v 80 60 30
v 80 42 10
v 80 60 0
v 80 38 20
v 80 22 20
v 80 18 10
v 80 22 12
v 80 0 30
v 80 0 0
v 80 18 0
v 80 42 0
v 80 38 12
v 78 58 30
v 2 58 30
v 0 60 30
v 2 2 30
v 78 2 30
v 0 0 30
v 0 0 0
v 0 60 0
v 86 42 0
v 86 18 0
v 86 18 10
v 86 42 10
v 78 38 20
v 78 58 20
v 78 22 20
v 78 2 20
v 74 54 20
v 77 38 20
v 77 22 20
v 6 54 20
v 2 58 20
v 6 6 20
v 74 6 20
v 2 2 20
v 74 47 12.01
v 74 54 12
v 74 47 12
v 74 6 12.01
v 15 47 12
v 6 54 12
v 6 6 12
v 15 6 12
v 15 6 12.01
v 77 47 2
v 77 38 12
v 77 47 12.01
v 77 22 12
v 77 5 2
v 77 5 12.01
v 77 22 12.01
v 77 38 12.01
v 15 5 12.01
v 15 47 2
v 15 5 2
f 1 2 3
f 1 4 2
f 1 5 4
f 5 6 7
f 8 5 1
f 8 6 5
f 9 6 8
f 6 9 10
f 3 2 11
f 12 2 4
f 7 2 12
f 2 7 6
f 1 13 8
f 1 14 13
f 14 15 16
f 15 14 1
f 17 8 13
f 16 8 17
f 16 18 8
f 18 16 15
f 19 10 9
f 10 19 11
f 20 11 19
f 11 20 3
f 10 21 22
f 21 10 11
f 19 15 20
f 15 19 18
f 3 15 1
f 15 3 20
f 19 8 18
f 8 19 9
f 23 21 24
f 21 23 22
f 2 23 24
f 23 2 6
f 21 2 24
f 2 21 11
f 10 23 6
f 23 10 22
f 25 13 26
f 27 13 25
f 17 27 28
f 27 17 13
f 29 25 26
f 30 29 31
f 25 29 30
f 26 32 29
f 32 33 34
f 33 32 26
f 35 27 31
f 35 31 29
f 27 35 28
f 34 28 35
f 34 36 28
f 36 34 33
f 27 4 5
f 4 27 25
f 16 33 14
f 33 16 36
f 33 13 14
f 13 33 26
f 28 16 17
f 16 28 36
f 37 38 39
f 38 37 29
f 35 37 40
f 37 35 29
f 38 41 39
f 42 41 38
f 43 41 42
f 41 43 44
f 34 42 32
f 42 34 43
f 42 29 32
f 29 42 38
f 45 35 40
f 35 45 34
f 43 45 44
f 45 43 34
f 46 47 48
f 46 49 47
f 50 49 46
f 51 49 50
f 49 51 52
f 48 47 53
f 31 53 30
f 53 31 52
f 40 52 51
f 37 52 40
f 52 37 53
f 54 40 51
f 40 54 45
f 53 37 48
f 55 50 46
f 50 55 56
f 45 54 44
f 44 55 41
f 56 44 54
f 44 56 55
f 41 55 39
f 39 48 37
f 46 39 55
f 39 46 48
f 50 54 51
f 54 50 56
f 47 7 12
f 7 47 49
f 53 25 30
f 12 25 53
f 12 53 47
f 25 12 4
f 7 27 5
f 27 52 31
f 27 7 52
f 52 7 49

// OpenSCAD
// Outer block dimensions
outer_w = 80;
outer_d = 60;
outer_h = 30;

// Rim and cavity depths
rim_t = 2;
upper_h = 10;
mid_h = 8;
deep_h = 10;

// Plan insets for each cavity step
mid_inset = 4;
deep_inset = 3;

// Shift of deepest pocket from center
deep_shift_x = 6;
deep_shift_y = -4;

// External projection on +X side
proj_w = 24;
proj_d = 6;
proj_h = 10;
proj_y_offset = 0;

// Side recess above projection
side_rec_w = 16;
side_rec_h = 8;
side_rec_depth = 3;
side_rec_z = 12;
side_rec_y_offset = 0;

$fn = 50;

// Derived cavity sizes
upper_w = outer_w - 2 * rim_t;
upper_d = outer_d - 2 * rim_t;
mid_w = upper_w - 2 * mid_inset;
mid_d = upper_d - 2 * mid_inset;
deep_w = mid_w - 2 * deep_inset;
deep_d = mid_d - 2 * deep_inset;

// Main solid with added side projection
module body_with_boss() {
    union() {
        cube([outer_w, outer_d, outer_h]);
        translate([outer_w, (outer_d - proj_w) / 2 + proj_y_offset, 0])
            cube([proj_d, proj_w, proj_h]);
    }
}

// Nested stepped cavity cut from top
module cavity_cuts() {
    // Upper broad recess
    translate([rim_t, rim_t, outer_h - upper_h])
        cube([upper_w, upper_d, upper_h + 0.01]);

    // Middle inset step
    translate([rim_t + mid_inset, rim_t + mid_inset, outer_h - upper_h - mid_h])
        cube([mid_w, mid_d, mid_h + 0.01]);

    // Deepest pocket, shifted to one side
    translate([
        (outer_w - deep_w) / 2 + deep_shift_x,
        (outer_d - deep_d) / 2 + deep_shift_y,
        outer_h - upper_h - mid_h - deep_h
    ])
        cube([deep_w, deep_d, deep_h + 0.01]);
}

// Recess on +X face above projection
module side_recess() {
    translate([
        outer_w - side_rec_depth,
        (outer_d - side_rec_w) / 2 + side_rec_y_offset,
        side_rec_z
    ])
        cube([side_rec_depth + 0.01, side_rec_w, side_rec_h]);
}

// Assembly
difference() {
    body_with_boss();
    cavity_cuts();
    side_recess();
}
